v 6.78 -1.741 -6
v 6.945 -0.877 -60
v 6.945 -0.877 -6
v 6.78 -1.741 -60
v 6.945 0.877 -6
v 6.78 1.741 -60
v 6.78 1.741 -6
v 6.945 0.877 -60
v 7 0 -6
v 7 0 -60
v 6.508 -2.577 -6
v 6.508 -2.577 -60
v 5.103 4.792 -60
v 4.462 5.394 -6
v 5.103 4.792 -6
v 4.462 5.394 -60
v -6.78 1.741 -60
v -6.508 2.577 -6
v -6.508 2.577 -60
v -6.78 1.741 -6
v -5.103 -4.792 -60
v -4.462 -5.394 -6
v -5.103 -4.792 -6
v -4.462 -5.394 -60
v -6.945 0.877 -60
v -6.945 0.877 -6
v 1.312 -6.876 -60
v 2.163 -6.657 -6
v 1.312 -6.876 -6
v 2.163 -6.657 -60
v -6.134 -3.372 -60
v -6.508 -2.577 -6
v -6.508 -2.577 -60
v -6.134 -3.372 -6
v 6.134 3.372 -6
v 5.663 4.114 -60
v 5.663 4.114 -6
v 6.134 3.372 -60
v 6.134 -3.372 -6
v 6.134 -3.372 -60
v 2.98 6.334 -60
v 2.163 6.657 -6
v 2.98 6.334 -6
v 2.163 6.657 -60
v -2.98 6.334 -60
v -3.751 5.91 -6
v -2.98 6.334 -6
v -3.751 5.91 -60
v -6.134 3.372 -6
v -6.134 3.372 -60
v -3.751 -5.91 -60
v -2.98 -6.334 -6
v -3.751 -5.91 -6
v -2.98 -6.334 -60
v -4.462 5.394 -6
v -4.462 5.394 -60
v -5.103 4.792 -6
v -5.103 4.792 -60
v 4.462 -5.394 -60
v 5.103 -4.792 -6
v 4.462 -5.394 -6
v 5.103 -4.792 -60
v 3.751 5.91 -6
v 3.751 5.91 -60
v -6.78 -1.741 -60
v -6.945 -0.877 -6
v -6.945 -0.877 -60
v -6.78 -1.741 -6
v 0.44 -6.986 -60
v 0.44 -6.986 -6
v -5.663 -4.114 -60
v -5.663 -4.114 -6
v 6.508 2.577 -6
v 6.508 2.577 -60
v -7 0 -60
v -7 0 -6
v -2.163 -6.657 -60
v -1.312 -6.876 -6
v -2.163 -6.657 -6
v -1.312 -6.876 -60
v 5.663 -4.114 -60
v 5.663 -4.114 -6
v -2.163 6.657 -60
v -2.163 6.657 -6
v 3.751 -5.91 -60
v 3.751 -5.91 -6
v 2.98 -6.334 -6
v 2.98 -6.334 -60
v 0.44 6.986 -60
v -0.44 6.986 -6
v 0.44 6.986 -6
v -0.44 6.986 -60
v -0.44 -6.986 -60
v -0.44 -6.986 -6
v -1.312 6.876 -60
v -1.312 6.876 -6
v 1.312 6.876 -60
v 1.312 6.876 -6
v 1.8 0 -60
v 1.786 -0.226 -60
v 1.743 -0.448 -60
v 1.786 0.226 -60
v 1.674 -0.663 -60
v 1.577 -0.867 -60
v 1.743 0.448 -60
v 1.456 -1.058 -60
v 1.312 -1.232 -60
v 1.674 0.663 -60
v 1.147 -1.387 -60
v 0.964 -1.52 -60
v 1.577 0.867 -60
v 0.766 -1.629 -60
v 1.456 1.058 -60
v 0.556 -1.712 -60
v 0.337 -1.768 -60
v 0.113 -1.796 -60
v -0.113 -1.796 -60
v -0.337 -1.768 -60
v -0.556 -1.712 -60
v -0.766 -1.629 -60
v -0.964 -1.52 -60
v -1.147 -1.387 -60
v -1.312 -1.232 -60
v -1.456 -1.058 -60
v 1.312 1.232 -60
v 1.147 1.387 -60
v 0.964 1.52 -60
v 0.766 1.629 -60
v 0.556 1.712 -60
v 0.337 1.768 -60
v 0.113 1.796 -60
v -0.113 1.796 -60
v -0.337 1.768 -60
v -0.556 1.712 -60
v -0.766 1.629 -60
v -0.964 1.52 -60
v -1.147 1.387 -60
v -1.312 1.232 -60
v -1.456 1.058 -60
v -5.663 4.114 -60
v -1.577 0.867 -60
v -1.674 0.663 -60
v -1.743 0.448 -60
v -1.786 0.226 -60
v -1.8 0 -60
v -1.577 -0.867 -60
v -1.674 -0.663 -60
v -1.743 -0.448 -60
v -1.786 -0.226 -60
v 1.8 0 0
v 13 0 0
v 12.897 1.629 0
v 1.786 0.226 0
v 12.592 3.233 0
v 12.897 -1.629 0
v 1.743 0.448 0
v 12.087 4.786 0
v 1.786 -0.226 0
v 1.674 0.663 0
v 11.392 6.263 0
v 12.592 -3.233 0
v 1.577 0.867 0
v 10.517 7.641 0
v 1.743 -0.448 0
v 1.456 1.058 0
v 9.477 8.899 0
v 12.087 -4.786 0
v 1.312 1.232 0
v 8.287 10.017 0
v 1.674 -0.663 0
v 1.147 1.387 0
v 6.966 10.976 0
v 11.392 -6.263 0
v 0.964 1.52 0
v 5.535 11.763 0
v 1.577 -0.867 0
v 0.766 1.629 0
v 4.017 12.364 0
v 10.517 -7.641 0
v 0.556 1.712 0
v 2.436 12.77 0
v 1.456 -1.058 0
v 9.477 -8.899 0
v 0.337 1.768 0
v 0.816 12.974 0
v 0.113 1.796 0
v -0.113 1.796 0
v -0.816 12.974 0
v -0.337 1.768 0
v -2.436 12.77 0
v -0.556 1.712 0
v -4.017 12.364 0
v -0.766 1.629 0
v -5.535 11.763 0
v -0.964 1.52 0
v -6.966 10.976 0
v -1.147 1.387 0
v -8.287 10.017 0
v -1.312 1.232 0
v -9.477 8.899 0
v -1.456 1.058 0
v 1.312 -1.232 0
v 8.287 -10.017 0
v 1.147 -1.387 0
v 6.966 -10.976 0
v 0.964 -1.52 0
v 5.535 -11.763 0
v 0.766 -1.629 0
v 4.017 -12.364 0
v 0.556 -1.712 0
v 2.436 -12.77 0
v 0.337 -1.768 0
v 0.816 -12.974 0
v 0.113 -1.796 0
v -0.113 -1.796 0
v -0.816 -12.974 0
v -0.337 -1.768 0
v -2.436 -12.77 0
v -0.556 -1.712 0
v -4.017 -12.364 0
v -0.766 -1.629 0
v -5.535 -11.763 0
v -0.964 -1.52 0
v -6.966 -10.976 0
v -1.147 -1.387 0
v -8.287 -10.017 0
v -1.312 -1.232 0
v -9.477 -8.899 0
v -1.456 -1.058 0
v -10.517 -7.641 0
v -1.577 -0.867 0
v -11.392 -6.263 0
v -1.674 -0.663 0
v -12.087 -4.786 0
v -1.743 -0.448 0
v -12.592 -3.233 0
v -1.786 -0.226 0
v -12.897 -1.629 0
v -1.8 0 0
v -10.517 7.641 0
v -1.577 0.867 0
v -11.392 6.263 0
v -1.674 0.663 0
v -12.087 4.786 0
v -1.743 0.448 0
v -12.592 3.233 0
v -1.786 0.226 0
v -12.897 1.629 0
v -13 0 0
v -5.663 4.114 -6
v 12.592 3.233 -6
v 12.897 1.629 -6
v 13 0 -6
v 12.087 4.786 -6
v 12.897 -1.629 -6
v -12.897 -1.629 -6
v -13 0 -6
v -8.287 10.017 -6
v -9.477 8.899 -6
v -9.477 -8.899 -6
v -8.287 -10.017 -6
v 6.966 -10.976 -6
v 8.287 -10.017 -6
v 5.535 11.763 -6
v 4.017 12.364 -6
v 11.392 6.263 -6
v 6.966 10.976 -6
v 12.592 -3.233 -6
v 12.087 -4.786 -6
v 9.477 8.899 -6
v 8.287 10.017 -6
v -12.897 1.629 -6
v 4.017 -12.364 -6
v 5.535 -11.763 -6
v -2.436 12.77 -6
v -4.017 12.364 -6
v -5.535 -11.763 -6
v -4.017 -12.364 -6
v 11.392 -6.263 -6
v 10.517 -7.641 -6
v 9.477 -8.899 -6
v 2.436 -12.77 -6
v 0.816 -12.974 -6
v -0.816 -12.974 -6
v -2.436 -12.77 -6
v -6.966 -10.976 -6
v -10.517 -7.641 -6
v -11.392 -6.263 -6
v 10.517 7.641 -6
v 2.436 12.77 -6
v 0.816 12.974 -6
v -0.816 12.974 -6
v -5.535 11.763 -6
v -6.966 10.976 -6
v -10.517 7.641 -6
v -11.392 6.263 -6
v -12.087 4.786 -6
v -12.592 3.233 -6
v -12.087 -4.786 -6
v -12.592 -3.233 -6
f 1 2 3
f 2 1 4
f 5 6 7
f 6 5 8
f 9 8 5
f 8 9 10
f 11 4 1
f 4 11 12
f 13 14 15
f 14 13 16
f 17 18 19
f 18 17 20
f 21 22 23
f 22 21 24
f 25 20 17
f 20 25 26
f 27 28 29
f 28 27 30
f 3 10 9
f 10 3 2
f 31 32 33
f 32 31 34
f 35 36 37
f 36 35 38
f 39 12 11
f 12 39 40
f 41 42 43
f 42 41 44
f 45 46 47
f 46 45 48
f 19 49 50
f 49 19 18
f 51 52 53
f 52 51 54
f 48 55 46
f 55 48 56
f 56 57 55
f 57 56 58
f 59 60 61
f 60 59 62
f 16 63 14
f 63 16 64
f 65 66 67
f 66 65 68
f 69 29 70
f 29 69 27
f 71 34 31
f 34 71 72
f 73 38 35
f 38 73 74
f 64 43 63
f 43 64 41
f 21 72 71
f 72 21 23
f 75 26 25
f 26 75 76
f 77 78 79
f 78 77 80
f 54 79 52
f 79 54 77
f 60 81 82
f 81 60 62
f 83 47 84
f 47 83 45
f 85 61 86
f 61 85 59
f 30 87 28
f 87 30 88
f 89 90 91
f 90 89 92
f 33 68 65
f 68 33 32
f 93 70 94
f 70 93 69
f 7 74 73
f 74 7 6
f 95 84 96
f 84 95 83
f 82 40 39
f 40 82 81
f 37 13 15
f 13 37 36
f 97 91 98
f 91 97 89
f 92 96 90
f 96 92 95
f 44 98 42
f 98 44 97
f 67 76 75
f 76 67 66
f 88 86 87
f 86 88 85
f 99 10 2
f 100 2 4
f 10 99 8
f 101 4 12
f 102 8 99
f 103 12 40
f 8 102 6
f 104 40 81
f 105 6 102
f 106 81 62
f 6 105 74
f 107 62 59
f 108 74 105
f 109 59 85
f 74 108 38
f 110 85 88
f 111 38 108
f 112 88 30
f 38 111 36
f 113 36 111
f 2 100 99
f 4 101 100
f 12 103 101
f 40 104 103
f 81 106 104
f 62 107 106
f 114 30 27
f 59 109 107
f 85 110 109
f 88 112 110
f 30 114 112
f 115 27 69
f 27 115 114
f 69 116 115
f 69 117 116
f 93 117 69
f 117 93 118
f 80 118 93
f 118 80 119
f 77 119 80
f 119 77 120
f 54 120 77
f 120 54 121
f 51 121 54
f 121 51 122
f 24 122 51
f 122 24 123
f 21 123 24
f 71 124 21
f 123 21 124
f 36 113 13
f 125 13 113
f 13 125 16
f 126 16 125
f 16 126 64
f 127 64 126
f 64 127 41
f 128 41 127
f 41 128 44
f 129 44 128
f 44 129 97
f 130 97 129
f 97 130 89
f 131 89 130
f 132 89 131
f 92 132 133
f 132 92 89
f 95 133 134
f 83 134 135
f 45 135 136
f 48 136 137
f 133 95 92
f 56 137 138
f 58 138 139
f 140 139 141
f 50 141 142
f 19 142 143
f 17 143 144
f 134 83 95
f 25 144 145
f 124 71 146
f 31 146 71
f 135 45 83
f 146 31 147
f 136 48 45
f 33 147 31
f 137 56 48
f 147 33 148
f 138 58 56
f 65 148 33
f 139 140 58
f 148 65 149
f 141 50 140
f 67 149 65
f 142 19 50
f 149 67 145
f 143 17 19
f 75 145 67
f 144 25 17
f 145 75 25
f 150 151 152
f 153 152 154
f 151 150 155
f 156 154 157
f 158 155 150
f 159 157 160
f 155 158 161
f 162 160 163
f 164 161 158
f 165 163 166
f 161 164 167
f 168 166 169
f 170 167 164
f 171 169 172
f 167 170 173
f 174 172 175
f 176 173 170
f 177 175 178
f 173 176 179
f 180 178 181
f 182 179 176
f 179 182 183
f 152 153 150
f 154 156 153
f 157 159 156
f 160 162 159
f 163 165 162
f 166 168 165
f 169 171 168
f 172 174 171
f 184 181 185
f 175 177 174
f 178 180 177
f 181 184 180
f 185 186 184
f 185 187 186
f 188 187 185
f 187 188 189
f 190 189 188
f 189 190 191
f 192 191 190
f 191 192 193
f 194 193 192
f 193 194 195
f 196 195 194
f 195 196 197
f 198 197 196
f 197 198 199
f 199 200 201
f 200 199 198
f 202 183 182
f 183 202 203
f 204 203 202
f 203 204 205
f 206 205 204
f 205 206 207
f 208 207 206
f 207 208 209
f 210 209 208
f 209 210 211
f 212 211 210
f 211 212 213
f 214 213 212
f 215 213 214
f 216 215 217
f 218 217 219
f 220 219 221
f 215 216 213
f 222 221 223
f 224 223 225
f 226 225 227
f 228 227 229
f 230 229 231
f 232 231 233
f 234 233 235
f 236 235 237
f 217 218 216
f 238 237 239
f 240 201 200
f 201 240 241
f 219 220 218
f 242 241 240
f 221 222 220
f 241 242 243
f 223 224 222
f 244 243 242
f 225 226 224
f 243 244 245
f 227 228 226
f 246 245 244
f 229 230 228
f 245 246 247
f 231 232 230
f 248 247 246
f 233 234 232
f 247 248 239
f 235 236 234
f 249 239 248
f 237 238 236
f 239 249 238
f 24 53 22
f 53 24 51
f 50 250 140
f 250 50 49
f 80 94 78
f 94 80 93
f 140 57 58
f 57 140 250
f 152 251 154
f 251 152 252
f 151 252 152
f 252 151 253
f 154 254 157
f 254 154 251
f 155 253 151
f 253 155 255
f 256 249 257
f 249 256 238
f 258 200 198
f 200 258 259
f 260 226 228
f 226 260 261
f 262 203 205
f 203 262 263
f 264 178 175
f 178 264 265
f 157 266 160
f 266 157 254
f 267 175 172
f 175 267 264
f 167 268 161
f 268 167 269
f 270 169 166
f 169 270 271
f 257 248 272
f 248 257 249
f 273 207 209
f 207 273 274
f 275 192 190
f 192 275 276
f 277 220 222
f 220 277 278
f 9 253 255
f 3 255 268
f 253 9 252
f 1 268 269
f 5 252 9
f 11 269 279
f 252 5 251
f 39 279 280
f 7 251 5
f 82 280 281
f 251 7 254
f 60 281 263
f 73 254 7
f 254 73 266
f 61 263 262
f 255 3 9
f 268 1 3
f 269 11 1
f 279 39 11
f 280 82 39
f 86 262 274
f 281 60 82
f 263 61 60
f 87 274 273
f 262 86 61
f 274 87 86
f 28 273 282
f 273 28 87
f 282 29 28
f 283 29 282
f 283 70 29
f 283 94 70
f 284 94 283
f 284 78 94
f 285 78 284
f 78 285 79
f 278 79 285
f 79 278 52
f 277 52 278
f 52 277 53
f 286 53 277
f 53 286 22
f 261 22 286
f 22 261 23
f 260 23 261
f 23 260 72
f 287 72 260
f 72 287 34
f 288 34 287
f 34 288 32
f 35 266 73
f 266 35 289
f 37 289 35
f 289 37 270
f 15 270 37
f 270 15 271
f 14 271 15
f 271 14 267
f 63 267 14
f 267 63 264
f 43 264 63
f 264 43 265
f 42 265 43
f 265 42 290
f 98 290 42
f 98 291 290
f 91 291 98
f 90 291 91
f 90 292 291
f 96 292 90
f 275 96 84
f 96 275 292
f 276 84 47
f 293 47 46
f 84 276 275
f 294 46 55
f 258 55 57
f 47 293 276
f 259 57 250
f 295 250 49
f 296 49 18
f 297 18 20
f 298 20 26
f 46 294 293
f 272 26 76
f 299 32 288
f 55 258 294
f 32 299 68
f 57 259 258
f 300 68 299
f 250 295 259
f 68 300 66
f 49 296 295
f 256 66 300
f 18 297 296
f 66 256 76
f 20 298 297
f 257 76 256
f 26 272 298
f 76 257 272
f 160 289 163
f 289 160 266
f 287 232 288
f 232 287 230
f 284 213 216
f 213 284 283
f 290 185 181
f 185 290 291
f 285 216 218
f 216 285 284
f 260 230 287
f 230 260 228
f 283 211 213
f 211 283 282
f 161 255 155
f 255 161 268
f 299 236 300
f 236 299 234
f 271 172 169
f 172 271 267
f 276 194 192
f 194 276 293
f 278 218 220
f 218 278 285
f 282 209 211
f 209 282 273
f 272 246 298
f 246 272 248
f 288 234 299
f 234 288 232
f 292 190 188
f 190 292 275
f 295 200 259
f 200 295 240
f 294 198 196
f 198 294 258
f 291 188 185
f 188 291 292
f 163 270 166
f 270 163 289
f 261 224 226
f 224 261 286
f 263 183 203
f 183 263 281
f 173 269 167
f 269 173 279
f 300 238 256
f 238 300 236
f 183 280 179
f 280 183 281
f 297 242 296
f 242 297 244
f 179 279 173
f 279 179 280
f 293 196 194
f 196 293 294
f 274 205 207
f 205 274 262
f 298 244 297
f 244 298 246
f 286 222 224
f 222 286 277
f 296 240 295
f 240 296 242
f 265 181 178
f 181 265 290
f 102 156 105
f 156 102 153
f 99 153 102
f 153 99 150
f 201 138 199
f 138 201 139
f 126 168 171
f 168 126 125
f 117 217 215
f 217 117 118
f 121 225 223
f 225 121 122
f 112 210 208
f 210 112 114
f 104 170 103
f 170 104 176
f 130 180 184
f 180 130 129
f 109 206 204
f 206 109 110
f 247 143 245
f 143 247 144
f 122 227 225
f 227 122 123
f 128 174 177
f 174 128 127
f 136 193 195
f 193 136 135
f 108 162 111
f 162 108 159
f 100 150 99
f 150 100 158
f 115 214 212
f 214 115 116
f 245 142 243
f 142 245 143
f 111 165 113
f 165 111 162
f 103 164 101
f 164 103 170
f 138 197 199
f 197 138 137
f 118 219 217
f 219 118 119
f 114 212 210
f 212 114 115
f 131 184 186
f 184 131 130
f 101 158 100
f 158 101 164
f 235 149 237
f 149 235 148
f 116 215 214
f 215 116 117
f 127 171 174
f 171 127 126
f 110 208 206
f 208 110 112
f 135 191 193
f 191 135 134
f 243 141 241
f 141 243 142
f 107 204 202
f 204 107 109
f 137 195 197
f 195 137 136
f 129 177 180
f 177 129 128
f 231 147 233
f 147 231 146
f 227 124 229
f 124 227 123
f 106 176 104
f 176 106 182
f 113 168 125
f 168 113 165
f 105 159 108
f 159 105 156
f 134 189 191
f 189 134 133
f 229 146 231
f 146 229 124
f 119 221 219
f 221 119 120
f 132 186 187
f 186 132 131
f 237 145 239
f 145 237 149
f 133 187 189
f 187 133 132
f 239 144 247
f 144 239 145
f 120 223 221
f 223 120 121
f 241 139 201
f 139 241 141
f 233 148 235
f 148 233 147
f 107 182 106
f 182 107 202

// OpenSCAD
$fn = 50;


difference() {
	union() {
		translate(v = [0, 0, -60.0000000000]) {
			cylinder(h = 60, r = 7.0000000000);
		}
		translate(v = [0, 0, -6.0000000000]) {
			cylinder(h = 6, r = 13.0000000000);
		}
	}
	union() {
		#translate(v = [0, 0, -60]) {
			cylinder(h = 60, r = 1.8000000000);
		}
	}
}
